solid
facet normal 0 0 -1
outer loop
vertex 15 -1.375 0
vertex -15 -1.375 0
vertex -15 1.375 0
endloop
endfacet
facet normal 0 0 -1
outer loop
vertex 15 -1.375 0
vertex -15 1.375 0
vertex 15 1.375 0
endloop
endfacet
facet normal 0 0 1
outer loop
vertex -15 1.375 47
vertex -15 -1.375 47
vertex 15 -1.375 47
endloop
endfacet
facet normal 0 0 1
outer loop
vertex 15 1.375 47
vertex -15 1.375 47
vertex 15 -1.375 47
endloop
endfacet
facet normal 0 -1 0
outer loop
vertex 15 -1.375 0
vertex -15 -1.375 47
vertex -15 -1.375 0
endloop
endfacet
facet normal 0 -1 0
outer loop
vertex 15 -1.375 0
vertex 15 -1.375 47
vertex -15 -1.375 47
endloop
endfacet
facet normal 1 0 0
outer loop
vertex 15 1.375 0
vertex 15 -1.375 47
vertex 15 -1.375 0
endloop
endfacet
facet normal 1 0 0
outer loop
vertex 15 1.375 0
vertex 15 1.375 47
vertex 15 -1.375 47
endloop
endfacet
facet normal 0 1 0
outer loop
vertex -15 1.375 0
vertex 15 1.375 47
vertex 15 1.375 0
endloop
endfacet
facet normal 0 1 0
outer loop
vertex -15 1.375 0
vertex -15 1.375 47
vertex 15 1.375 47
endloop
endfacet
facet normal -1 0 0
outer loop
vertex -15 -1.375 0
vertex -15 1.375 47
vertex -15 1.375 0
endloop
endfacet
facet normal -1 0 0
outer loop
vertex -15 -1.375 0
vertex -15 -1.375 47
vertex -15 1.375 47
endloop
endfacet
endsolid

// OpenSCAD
// file: configuration.scad
$fn=20; // model faces resolution.

vzdalenost_der = 10; //rozteč děr mezi sebou

//sloupek
vyska = 60;  //celeho sloupku
zapust=6; //zápust ve sloupku pro listu
tolerance=0.5; //tolerance mezi zapusti v sloupku  a v listě
zapust1=zapust+tolerance;
radidus_hrany = 5; //radius zaobleni sloupku

//parametry šroubu
vyska_hlavy = 3.5;
prumer_hlavy=6;
prumer_sroubu=3.3;

//parametry matice
prumer_matice=6; //hrany k hraně
vyska_matice=3;  //vyska matice
posuv_dorazu=0;  //pro moznost posuvu dorazu pro vsunutí matice
matice_sila_materialu=2; //sila materialu pod maticí na ose z




//---------------------------------------------------
//parametry lišty
//malá list
pocet_der1 = 14; //pocet der pres ktere je lista, ponížené o 1

//velká list
pocet_der2 = 21; //pocet ter pres ktere je lista ponížené o 1


//rozměry výrezu
//rozmer v ose y
vzdalenost_od_okraje = 10; //vzdalenost stredu upevnovaci diry od kraje desky
vzdalenost_od_diry = 5; //vzdalenost od stredu upevnovaci diry na druhou stranu

//rozmery vyrezu v ose x
vzdalenost_1 = 4.6; //od díry ke kraji
vzdalenost_2 = 5;

vyska_listy=5; //definuje výšku žlábku do kterého se vsunuje čelíčko

//parametry pro úžlabinu
sirka_materialu = 3; //sirka materialu od kraje desky k uzlabine


//--------------------------------------------------
//čelicko
vule_vysky_celicka =1; //definuje vůli celicka v liste
delka_celicka=30;
tloustka_celicka = 3;
vule_tlousky = 0.25;
// main file
include <configuration.scad>

difference () {
color("cyan")
    translate([0, 0, 0])
        linear_extrude(height = vyska-2*zapust-vule_vysky_celicka)
            square([delka_celicka, tloustka_celicka-vule_tlousky], center = true); 
    
     }
